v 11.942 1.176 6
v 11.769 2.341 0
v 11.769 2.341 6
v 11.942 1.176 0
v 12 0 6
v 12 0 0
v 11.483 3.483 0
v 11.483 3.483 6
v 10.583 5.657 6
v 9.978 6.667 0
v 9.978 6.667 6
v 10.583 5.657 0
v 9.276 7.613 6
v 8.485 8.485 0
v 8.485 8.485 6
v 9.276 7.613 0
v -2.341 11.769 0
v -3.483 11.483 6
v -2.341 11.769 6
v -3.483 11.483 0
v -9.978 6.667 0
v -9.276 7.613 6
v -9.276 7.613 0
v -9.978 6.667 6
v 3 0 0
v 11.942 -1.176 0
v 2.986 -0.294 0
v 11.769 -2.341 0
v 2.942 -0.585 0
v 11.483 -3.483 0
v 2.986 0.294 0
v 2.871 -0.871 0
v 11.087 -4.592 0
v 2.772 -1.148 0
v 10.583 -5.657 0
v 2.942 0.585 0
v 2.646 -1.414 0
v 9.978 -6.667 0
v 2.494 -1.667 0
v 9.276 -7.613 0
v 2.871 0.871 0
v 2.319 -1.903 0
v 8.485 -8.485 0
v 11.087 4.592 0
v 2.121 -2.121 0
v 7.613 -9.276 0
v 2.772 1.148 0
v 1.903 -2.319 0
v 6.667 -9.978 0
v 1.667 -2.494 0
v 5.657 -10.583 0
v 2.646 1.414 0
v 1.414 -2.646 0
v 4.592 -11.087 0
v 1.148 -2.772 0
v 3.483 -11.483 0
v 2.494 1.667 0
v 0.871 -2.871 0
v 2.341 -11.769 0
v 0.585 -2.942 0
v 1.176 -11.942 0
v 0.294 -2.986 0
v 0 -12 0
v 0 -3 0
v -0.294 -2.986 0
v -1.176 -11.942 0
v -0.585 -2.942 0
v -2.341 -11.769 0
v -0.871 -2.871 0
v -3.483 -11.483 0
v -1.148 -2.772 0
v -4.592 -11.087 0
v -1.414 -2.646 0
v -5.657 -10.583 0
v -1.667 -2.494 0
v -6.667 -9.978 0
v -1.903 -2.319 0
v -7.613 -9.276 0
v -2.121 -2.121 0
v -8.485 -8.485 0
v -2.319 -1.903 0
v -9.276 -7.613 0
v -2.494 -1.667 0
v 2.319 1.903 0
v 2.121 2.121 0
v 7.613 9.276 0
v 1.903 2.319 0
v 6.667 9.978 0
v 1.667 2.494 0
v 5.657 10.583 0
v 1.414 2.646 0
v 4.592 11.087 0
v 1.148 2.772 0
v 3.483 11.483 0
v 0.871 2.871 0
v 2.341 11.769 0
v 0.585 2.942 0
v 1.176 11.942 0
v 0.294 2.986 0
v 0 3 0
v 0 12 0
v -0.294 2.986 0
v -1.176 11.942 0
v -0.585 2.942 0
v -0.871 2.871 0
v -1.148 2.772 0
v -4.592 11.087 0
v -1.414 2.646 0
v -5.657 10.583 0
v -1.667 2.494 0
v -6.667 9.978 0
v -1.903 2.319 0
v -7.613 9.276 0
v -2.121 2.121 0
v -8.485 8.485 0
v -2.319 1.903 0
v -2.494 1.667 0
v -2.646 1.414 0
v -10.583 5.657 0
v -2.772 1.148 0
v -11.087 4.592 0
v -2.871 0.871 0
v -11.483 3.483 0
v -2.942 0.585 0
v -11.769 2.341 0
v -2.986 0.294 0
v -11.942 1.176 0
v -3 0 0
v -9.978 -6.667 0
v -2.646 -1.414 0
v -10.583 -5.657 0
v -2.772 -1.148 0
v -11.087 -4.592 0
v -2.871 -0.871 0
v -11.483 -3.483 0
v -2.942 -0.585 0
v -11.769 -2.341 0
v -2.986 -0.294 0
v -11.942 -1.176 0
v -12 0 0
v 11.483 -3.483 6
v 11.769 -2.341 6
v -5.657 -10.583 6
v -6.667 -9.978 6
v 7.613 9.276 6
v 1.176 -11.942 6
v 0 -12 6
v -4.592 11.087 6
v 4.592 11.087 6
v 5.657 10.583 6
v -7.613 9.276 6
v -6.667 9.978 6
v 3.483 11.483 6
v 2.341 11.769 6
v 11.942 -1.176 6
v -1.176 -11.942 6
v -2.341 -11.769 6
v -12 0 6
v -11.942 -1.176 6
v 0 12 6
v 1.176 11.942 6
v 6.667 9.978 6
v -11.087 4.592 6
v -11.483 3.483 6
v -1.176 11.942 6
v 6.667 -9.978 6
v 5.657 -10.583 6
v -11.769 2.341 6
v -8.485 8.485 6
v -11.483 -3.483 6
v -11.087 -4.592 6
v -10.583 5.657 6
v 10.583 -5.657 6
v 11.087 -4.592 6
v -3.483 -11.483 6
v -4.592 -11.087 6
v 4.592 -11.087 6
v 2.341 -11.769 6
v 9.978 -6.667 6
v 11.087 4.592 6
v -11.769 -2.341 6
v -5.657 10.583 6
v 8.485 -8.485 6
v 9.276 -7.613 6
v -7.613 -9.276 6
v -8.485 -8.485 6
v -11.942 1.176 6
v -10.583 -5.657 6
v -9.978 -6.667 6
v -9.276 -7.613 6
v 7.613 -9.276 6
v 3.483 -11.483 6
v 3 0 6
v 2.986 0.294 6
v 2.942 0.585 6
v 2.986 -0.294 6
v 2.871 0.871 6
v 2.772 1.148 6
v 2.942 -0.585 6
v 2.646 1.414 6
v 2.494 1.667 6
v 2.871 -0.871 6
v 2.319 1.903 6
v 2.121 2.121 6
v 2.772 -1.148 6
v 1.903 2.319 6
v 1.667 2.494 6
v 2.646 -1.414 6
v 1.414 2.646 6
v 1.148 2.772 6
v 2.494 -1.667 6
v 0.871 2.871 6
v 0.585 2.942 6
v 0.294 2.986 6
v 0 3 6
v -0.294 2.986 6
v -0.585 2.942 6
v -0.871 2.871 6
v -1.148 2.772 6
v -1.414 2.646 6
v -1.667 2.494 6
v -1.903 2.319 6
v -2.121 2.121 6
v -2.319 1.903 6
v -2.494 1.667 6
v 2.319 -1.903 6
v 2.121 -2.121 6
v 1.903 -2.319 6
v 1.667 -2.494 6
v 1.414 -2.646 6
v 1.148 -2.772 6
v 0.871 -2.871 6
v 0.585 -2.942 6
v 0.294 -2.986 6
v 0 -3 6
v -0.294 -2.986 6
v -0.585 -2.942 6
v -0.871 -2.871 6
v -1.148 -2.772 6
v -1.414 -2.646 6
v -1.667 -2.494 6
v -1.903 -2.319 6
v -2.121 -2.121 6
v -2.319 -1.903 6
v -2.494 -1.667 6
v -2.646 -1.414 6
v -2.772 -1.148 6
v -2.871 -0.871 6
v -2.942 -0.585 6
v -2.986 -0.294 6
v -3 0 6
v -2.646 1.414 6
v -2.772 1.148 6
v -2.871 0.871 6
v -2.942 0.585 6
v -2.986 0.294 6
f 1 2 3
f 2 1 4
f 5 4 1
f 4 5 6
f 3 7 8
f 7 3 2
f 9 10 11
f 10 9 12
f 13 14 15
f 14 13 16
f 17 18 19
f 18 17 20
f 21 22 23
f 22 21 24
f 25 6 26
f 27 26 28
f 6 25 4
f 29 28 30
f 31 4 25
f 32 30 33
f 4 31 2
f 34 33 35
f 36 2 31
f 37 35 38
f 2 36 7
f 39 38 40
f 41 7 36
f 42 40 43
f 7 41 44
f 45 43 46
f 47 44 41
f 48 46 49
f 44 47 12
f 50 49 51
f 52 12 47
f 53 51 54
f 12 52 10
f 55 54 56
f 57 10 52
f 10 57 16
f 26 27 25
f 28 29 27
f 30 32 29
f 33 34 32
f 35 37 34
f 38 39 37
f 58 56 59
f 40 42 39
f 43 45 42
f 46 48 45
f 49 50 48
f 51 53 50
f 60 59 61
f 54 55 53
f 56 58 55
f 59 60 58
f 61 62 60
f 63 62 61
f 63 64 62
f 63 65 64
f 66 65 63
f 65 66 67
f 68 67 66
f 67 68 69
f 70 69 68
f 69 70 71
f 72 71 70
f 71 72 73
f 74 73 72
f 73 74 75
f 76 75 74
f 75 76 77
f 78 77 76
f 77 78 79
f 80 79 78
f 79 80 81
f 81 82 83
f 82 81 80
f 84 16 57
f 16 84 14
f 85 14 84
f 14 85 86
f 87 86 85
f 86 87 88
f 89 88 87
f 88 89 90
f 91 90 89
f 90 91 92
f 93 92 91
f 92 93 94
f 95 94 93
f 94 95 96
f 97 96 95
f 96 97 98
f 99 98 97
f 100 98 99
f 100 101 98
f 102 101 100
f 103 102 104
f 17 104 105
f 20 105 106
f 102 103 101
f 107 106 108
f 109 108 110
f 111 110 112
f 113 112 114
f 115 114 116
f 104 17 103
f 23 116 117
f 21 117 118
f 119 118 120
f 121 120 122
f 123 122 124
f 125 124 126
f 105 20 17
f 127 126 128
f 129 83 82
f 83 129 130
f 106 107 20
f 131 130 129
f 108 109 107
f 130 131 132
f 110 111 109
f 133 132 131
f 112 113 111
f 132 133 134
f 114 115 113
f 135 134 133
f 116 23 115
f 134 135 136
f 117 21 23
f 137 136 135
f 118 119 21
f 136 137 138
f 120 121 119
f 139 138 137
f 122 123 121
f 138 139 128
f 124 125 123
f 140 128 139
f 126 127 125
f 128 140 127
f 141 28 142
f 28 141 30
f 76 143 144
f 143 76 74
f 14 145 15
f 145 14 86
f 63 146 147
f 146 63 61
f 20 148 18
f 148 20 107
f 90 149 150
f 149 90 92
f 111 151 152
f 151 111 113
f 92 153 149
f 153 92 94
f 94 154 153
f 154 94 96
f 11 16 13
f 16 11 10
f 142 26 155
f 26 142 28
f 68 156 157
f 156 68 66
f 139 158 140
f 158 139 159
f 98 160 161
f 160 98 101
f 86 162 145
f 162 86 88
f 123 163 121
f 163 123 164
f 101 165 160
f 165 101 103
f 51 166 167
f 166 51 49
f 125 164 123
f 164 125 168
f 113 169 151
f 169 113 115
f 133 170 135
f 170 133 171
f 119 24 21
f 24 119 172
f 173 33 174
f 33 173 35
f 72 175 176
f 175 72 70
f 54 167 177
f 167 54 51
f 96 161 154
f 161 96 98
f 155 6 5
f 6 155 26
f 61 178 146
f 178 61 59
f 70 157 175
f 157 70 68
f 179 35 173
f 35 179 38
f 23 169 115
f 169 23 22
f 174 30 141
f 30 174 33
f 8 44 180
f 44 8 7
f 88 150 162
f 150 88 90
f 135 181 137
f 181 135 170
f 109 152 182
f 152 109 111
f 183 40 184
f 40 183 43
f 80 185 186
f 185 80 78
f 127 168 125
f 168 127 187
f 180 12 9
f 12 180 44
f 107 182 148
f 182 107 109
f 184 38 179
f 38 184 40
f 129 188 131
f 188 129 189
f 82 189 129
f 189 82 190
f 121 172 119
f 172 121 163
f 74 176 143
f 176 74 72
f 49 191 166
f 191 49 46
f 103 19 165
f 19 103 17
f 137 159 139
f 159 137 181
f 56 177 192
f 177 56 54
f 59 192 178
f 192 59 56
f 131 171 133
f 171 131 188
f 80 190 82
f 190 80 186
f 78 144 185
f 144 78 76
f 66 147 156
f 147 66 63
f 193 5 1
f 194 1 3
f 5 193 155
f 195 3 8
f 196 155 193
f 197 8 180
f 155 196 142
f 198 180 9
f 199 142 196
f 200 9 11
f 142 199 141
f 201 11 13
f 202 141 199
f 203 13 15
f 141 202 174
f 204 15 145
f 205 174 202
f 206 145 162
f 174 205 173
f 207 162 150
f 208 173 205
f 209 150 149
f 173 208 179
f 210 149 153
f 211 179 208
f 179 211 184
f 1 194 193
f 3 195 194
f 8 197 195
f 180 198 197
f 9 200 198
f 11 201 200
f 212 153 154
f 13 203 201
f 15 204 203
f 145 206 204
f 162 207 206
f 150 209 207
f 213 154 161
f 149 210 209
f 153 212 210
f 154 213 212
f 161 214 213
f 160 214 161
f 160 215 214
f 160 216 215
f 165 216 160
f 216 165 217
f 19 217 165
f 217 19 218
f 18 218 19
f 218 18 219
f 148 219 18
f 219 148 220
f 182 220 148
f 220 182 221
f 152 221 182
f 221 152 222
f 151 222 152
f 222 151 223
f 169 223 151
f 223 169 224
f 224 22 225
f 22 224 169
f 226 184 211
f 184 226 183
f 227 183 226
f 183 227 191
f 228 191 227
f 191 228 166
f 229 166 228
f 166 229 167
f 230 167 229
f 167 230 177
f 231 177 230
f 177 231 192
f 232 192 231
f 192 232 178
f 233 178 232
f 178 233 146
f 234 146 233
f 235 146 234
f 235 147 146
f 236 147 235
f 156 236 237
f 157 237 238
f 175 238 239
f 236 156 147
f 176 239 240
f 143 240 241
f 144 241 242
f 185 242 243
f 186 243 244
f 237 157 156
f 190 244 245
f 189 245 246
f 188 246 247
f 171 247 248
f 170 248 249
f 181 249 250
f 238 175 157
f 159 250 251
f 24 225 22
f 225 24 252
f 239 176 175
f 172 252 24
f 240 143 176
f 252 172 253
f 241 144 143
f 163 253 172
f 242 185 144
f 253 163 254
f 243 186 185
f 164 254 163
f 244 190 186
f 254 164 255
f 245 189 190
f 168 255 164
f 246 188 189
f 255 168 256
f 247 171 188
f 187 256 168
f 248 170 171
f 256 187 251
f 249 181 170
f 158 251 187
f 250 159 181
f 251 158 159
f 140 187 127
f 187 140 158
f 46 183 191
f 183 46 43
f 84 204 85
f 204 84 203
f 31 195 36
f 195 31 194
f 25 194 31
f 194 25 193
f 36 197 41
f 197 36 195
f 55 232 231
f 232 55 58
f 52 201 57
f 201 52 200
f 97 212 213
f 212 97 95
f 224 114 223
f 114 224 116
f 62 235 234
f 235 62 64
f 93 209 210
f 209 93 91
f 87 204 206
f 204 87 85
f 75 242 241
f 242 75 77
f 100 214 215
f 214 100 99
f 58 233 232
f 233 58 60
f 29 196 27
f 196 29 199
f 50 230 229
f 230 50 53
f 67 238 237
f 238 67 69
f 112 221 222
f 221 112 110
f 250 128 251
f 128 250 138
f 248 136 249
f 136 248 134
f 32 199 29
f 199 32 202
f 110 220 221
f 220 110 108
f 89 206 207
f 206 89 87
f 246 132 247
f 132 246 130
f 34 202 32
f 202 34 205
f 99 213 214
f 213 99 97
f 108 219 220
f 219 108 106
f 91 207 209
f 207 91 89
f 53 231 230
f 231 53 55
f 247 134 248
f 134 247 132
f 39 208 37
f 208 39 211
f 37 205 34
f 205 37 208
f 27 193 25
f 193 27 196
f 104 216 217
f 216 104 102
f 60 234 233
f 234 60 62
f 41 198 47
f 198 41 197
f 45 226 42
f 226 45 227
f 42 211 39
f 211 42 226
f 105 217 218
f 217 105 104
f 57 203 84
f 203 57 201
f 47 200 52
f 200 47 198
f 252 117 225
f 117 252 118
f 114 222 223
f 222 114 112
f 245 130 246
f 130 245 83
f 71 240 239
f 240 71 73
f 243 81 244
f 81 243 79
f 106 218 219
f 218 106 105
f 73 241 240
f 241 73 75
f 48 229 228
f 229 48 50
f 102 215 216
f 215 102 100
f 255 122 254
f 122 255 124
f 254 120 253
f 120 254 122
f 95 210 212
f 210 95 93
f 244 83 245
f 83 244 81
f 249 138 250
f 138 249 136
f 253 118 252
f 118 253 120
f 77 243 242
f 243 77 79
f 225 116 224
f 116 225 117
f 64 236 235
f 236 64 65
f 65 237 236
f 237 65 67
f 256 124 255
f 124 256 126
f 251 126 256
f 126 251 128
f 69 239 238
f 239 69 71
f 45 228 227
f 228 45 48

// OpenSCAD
// SPDX-License-Identifier: AGPL-3.0-or-later
/* [Afmetingen] */
// Buitendiameter
diameter = 24; // [12:1:60]
// Dikte
thickness = 6; // [1:0.5:12]
// Gatdiameter
bore = 6; // [2:1:10]
/* [Hidden] */
$fn = 64;
difference() {
    cylinder(d=diameter, h=thickness);
    translate([0, 0, -1]) cylinder(d=bore, h=thickness+2);
}
